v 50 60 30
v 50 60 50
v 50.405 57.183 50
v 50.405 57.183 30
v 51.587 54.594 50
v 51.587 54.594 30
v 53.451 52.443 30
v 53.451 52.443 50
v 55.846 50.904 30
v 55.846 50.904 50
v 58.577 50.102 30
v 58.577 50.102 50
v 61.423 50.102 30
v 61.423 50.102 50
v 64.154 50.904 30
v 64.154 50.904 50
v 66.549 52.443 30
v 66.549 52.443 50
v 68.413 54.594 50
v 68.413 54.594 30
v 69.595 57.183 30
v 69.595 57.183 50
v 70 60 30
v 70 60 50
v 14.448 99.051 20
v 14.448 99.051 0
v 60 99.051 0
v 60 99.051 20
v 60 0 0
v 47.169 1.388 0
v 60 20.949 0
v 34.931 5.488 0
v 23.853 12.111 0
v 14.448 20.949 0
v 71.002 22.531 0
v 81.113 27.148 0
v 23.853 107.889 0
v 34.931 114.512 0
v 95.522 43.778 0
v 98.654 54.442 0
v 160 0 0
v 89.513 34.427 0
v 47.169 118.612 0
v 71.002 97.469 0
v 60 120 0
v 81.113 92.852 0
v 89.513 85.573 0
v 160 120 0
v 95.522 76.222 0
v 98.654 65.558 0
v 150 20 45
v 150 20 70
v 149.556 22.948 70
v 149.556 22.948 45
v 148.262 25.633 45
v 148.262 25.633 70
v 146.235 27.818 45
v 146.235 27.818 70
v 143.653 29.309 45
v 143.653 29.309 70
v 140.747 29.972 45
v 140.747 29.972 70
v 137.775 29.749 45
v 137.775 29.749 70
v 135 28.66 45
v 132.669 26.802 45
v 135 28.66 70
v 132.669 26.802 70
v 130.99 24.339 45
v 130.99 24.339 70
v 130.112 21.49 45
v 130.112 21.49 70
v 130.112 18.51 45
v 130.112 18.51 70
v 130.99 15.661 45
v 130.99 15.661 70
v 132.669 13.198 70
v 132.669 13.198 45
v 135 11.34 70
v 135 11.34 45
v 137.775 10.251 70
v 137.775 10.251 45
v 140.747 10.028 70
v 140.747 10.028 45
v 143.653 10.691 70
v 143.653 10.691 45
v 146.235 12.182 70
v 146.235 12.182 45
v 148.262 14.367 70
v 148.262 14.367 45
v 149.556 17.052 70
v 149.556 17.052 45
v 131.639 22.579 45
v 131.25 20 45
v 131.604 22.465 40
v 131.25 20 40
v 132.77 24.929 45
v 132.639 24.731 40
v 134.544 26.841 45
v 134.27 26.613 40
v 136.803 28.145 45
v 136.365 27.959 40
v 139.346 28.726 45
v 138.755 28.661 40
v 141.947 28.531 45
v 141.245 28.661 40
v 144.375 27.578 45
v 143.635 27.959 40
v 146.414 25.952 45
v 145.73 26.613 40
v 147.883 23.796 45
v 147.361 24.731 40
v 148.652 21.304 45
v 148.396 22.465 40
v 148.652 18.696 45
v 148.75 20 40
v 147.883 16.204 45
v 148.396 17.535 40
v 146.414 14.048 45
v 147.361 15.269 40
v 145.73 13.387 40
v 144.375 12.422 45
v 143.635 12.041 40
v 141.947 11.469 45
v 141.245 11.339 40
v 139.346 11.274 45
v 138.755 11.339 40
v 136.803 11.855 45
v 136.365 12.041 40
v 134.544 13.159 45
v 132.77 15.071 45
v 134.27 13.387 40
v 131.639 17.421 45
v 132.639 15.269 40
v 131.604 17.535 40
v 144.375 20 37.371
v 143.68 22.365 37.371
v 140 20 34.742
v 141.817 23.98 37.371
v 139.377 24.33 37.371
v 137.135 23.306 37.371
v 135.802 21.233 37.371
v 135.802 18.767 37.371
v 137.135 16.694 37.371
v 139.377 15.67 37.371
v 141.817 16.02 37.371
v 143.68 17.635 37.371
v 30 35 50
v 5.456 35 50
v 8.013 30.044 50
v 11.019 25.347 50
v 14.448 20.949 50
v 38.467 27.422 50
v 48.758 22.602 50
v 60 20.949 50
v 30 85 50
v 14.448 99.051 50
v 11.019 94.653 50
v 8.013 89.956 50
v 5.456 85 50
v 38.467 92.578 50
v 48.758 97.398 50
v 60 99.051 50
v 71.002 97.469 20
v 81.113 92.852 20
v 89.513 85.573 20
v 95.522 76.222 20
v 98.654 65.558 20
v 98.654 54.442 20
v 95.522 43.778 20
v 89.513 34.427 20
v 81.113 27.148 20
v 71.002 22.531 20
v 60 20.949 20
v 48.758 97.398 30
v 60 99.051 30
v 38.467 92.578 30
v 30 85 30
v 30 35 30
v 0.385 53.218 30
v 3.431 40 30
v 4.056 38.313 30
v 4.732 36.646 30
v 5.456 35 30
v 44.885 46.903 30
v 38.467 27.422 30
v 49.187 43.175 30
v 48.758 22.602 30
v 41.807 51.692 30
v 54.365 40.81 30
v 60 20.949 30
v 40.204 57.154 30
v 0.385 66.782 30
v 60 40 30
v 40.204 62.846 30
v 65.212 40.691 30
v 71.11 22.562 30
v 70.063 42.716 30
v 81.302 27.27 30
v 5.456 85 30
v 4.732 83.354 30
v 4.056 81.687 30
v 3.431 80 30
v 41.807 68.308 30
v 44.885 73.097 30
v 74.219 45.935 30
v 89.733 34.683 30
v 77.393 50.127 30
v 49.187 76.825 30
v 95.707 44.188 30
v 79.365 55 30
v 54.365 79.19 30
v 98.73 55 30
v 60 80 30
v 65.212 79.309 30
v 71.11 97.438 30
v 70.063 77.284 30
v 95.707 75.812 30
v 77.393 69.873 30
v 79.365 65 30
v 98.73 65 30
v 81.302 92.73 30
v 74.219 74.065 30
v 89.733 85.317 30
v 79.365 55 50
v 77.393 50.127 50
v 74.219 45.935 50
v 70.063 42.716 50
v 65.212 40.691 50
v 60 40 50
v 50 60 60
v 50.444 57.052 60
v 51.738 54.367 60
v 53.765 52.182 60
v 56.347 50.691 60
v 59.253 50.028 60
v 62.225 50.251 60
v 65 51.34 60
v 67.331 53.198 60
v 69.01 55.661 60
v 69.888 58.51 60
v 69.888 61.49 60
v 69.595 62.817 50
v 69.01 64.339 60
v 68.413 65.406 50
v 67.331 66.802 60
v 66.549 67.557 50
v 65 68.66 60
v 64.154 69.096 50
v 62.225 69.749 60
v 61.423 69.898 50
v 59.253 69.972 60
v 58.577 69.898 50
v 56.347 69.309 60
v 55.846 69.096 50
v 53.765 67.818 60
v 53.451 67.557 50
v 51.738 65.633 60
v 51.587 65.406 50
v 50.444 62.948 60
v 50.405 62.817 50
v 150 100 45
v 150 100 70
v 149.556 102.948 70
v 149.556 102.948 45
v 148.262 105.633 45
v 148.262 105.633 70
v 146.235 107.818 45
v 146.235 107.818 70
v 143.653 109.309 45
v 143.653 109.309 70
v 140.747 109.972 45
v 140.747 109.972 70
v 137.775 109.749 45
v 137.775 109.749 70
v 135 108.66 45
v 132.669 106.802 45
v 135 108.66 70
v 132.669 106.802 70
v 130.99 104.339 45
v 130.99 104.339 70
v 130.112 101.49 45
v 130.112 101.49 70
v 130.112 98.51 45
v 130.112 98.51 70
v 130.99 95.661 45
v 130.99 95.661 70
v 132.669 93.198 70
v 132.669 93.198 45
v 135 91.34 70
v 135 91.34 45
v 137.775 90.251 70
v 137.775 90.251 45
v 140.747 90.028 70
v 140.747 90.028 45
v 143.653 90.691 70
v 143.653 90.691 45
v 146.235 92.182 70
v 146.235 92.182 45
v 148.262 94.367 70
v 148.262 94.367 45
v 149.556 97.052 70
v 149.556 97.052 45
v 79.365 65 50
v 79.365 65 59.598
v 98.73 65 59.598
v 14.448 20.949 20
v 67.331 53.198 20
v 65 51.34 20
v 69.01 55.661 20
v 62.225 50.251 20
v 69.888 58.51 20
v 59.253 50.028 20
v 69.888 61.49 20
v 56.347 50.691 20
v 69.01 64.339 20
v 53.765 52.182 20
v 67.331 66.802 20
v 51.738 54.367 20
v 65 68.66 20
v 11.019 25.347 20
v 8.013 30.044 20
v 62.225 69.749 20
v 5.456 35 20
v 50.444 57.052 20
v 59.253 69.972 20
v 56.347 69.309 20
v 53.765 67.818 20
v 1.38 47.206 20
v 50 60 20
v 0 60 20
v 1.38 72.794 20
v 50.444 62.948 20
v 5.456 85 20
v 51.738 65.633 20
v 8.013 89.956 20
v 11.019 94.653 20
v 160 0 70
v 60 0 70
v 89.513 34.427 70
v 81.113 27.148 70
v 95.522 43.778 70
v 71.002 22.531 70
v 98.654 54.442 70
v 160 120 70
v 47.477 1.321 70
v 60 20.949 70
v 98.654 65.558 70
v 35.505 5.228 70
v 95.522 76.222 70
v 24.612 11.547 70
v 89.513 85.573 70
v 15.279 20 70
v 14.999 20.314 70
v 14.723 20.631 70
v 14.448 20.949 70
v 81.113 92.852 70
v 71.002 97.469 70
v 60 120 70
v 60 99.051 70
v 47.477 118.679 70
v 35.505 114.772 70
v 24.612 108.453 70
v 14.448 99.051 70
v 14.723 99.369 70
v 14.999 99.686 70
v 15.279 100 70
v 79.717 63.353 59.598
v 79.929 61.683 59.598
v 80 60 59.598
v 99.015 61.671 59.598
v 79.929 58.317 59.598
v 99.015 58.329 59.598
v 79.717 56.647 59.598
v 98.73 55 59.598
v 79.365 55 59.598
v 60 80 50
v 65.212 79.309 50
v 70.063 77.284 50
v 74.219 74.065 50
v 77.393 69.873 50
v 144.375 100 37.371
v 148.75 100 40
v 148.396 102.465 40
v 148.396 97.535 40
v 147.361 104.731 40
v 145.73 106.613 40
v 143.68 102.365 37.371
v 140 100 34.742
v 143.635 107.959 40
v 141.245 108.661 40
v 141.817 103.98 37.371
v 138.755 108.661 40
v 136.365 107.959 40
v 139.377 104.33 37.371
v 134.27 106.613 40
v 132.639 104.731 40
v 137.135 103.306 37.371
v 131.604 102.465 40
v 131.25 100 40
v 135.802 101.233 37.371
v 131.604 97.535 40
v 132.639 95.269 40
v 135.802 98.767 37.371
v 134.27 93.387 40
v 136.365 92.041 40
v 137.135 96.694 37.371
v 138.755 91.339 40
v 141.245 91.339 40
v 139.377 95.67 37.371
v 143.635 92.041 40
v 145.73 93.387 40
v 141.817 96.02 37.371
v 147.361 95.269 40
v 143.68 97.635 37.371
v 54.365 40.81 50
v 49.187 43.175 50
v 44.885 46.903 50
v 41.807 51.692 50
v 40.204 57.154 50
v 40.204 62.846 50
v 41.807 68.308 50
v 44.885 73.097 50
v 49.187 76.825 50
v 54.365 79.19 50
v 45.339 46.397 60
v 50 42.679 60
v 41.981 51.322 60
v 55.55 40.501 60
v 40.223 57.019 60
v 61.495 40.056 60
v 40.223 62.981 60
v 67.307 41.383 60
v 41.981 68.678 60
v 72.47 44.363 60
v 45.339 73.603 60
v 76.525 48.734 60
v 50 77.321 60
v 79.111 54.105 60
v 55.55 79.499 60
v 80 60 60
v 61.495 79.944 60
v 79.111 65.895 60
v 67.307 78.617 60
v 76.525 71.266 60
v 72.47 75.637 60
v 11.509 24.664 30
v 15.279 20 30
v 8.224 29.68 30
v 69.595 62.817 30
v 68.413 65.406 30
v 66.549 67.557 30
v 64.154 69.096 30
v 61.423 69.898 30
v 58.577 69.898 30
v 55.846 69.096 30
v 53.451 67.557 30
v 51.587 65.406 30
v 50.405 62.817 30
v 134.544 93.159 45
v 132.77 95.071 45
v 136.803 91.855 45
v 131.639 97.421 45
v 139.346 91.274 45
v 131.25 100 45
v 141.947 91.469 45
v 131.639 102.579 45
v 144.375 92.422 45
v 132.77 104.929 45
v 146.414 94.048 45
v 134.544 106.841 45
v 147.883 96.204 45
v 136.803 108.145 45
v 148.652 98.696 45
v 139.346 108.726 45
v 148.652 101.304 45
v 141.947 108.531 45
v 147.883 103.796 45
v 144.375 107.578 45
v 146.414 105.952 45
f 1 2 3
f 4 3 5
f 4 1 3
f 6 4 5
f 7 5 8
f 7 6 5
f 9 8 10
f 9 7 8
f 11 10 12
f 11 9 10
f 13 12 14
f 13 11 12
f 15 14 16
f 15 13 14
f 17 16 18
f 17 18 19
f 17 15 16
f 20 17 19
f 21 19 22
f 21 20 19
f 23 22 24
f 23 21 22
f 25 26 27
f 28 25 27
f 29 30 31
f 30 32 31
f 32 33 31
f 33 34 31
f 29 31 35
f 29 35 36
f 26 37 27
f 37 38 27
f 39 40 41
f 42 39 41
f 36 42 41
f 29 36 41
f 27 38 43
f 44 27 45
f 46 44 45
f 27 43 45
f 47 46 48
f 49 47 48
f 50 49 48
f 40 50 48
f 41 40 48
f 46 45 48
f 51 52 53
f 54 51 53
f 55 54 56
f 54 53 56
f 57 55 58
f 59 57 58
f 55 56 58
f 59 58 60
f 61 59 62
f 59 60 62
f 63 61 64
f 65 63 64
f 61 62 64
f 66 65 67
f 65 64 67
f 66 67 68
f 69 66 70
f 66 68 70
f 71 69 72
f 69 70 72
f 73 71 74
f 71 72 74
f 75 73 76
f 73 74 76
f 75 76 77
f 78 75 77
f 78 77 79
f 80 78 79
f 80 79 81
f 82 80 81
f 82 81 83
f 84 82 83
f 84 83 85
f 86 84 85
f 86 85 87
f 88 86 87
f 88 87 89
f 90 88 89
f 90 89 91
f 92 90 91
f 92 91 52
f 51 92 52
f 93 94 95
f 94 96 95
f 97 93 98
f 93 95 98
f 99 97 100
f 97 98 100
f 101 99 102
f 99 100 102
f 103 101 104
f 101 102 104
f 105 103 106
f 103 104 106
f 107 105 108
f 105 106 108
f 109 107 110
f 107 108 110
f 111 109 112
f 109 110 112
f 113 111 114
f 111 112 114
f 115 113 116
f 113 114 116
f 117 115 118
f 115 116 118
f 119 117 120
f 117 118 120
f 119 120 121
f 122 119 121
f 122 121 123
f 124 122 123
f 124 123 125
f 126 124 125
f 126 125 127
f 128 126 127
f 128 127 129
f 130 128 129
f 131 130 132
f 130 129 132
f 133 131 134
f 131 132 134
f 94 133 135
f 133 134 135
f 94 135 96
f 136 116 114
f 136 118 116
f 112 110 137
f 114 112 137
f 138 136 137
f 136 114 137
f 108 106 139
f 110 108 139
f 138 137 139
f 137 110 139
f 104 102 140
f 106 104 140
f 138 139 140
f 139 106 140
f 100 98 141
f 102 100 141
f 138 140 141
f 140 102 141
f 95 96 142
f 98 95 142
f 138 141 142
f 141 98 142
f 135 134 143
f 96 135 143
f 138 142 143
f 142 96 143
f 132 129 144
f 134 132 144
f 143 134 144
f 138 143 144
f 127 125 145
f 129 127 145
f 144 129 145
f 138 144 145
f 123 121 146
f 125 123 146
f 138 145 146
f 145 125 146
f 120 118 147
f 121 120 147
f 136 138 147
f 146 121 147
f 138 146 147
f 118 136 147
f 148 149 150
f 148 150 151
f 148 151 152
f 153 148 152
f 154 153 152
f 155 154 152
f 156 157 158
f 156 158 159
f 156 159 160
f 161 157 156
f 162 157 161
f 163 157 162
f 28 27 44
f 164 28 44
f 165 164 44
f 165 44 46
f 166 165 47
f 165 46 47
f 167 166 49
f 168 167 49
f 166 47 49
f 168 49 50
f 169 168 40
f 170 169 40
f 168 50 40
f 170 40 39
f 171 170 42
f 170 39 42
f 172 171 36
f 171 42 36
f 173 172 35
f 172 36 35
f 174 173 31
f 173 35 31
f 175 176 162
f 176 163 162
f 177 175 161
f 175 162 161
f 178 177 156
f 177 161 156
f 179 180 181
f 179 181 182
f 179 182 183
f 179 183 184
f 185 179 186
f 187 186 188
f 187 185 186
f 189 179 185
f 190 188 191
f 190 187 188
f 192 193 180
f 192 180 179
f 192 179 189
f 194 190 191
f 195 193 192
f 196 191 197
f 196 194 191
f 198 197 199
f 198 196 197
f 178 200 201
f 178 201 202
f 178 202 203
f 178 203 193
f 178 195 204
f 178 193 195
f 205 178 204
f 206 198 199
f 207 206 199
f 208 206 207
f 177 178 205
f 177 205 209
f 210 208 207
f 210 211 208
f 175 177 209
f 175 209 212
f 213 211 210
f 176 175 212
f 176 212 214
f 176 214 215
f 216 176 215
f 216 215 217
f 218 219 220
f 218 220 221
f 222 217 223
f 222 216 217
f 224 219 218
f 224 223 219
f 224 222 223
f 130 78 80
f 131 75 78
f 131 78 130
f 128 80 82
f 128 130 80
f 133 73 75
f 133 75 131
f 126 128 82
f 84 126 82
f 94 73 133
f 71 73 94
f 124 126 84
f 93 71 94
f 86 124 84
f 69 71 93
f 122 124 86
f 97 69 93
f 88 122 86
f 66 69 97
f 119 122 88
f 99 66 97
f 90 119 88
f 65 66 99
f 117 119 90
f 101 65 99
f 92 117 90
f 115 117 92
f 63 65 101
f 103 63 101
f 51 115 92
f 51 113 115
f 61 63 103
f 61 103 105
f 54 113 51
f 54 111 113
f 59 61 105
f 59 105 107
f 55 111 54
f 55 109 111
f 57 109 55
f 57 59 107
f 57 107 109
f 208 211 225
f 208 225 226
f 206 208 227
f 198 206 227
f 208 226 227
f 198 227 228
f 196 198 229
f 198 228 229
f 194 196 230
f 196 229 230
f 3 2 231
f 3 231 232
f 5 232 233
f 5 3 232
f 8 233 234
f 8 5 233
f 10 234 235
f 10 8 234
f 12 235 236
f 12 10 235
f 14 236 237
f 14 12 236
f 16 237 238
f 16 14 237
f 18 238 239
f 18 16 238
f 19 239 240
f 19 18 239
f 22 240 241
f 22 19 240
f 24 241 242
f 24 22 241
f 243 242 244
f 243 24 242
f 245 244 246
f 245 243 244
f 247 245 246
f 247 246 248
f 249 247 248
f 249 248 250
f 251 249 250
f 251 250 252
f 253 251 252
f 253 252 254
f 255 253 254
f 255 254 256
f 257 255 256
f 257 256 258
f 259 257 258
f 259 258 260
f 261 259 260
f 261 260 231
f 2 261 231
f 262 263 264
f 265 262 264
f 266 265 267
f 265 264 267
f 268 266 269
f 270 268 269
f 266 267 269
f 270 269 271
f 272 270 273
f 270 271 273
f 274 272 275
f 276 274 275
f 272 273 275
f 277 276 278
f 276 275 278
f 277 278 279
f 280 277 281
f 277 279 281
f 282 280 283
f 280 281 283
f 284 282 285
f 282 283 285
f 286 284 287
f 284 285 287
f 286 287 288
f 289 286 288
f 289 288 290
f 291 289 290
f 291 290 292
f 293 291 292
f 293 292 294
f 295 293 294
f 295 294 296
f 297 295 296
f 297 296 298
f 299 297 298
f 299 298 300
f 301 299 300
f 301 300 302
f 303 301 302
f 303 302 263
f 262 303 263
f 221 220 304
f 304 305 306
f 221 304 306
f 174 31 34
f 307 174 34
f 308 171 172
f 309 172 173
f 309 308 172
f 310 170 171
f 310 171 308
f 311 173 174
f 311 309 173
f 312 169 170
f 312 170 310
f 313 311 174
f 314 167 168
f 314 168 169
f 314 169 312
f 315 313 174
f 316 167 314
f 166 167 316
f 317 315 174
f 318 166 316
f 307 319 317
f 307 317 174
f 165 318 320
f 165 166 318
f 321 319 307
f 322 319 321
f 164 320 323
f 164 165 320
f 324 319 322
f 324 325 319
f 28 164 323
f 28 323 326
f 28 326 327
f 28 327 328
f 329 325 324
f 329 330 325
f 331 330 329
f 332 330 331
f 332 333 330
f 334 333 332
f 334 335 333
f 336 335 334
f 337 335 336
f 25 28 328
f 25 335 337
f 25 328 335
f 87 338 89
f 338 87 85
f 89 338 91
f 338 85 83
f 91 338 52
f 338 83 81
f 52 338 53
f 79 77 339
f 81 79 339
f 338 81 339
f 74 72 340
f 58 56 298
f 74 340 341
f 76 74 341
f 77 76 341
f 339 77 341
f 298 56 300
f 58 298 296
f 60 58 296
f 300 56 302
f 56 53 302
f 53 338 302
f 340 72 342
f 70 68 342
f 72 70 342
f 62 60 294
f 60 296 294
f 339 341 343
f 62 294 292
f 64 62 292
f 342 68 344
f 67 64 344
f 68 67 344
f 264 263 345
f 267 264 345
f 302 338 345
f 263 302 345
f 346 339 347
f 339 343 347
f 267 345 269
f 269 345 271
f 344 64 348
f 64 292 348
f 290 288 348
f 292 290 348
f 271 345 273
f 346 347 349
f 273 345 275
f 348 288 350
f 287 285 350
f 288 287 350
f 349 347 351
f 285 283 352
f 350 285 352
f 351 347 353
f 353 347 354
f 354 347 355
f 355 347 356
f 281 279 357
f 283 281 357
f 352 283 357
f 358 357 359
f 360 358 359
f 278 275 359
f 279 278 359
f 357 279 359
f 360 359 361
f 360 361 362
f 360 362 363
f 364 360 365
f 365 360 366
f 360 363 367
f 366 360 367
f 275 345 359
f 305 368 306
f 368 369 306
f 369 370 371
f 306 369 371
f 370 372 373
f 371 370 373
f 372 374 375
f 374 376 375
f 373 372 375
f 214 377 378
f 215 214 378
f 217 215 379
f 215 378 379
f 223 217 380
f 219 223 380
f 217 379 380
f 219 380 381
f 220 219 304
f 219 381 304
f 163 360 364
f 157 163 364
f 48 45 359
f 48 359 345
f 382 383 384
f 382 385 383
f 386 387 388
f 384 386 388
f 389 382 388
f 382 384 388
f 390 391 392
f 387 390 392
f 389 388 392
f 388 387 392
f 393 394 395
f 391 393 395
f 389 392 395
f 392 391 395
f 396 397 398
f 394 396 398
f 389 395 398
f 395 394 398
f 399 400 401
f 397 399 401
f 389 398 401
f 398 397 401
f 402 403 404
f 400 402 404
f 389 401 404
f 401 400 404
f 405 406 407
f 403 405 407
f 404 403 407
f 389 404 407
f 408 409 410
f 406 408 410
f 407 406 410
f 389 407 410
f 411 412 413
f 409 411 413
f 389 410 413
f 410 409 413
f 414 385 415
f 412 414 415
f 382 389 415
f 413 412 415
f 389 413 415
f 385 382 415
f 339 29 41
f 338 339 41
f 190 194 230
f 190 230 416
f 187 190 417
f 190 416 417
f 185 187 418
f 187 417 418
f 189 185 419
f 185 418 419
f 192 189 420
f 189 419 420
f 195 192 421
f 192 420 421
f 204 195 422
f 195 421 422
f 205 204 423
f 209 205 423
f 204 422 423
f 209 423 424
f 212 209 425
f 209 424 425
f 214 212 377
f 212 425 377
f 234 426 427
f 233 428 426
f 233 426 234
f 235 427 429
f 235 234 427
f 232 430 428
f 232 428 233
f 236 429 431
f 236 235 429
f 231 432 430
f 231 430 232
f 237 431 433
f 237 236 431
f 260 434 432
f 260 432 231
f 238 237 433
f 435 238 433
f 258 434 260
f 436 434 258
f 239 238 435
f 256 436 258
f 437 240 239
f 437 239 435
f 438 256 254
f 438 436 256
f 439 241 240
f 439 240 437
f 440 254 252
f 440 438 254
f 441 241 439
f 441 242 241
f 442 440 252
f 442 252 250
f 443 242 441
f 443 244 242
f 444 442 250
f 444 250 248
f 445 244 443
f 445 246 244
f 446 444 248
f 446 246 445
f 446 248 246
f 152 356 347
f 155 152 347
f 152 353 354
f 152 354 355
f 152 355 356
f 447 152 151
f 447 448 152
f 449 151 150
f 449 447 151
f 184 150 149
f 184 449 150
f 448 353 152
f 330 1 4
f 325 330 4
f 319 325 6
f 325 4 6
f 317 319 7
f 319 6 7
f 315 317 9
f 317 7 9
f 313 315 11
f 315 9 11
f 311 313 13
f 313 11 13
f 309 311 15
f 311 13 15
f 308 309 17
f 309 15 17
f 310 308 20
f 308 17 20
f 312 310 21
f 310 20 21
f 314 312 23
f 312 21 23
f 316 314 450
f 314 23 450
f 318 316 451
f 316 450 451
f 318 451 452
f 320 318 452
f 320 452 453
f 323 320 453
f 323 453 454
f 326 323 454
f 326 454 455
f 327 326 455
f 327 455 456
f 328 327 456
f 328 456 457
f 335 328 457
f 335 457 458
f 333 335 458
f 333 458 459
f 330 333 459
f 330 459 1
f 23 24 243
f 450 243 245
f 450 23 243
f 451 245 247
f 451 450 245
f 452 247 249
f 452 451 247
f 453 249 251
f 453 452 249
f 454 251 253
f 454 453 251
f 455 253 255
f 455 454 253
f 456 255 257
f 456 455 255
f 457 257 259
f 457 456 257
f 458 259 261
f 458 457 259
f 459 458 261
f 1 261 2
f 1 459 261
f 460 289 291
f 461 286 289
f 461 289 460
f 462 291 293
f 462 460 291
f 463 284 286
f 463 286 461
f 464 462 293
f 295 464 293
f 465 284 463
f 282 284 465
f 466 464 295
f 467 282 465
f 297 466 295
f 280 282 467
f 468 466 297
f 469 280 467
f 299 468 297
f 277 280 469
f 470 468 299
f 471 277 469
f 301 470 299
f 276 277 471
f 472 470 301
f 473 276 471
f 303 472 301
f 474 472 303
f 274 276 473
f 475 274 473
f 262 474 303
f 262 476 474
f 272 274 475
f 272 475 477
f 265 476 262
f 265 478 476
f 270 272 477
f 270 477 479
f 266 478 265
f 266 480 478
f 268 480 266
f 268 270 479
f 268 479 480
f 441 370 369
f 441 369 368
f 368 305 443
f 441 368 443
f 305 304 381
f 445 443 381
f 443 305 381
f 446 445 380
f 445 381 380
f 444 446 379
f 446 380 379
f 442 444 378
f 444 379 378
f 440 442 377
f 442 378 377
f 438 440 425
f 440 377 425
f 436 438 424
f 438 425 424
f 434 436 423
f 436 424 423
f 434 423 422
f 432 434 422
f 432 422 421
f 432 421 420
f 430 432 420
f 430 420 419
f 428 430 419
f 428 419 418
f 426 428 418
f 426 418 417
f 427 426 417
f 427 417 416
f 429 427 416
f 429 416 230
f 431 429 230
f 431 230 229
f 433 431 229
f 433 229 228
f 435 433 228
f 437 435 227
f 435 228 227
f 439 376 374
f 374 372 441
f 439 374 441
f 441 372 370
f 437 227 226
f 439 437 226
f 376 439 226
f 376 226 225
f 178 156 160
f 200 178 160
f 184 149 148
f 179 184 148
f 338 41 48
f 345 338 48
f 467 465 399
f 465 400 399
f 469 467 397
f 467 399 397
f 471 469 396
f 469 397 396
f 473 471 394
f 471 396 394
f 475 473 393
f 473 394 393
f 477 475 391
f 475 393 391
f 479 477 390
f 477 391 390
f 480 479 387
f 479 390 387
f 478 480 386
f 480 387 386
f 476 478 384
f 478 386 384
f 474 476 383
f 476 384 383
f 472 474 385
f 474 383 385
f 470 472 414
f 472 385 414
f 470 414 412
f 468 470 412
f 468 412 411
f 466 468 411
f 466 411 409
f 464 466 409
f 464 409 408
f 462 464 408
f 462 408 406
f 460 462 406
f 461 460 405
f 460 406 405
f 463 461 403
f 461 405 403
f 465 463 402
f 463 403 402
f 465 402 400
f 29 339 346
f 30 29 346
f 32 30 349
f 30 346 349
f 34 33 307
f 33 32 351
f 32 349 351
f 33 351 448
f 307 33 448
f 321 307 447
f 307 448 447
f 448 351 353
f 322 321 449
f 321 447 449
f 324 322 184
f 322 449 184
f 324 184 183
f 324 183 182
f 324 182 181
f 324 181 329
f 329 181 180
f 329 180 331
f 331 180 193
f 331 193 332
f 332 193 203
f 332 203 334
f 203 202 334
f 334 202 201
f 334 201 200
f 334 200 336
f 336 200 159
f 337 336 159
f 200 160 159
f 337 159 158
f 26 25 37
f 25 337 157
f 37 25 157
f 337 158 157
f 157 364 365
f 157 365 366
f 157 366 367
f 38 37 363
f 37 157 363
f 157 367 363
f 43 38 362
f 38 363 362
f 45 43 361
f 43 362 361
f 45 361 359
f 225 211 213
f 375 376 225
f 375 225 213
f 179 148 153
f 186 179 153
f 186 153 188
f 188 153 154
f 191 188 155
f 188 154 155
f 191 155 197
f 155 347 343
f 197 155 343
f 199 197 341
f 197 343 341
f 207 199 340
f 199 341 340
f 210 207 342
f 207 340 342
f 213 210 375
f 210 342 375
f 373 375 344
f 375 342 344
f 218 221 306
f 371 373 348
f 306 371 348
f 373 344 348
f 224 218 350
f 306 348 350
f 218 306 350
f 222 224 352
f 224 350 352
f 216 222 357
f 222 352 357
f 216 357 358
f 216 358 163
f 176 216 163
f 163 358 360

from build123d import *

# Parameters (mm, degrees)
SKETCH1_W                    = 160
SKETCH1_H                    = 120
BOSS_EXTRUDE1_DEPTH          = 70
CUT_EXTRUDE1_DEPTH           = 70
M20_TAPPED_HOLE3_D           = 17.5
M20_TAPPED_HOLE3_DEPTH       = 30
M20_TAPPED_HOLE3_CBORE_D     = 20
M20_TAPPED_HOLE3_CBORE_DEPTH = 25
M20_TAPPED_HOLE3_TIP         = 5.257530416
F_20_0MM_DOWEL_SLOT1_D       = 20
F_20_0MM_DOWEL_SLOT1_DEPTH   = 40
F_20_0MM_DOWEL_SLOT1_TIP     = 6.00860619
SKETCH16_R                   = 10
CUT_EXTRUDE3_DEPTH           = 40
CUT_EXTRUDE4_DEPTH           = 40
SKETCH18_R                   = 10
BOSS_EXTRUDE2_DEPTH          = 40
CUT_EXTRUDE6_DEPTH           = 20
SKETCH20_R                   = 10
CUT_EXTRUDE7_DEPTH           = 71
SKETCH21_R                   = 10
CUT_EXTRUDE8_DEPTH           = 20
CUT_EXTRUDE11_DEPTH          = 20
CUT_EXTRUDE12_DEPTH          = 20
SKETCH25_R                   = 20
SKETCH25_R_2                 = 10
BOSS_EXTRUDE6_DEPTH          = 10
RIB1_REACH                   = 186.662
SKETCH26_WALL_W              = 391.050063724
SKETCH26_WALL_H              = 10


with BuildPart() as part:
    # Sketch1 → Boss-Extrude1 (new body)
    with BuildSketch(Plane.XY):
        with Locations((80, 60)):
            Rectangle(SKETCH1_W, SKETCH1_H)
    extrude(amount=BOSS_EXTRUDE1_DEPTH)

    # Sketch2 → Cut-Extrude1 (cut)
    with BuildSketch(Plane.XY.offset(70)):
        with BuildLine():
            Line((60, 120), (0, 120))
            Line((0, 120), (0, 60))
            ThreePointArc((0, 60), (17.573593129, 102.426406871), (60, 120))
        make_face()
        with BuildLine():
            ThreePointArc((60, 0), (17.573593129, 17.573593129), (0, 60))
            Line((0, 60), (0, 0))
            Line((0, 0), (60, 0))
        make_face()
    extrude(amount=-CUT_EXTRUDE1_DEPTH, mode=Mode.SUBTRACT)

    # M20 Tapped Hole3
    with Locations(Plane(origin=(140, 100, 70), x_dir=(1, 0, 0), z_dir=(0, 0, 1))):
        with Locations((0, 0), (0, -80)):
            CounterBoreHole(M20_TAPPED_HOLE3_D / 2, M20_TAPPED_HOLE3_CBORE_D / 2, M20_TAPPED_HOLE3_CBORE_DEPTH, depth=M20_TAPPED_HOLE3_DEPTH)
            with Locations((0, 0, -(M20_TAPPED_HOLE3_DEPTH + M20_TAPPED_HOLE3_TIP / 2))):  # 118° drill point
                Cone(0, M20_TAPPED_HOLE3_D / 2, M20_TAPPED_HOLE3_TIP, mode=Mode.SUBTRACT)

    # 20.0mm Dowel Slot1
    with Locations(Plane.XY.offset(70)):
        with Locations((60, 60)):
            Hole(F_20_0MM_DOWEL_SLOT1_D / 2, depth=F_20_0MM_DOWEL_SLOT1_DEPTH)
            with Locations((0, 0, -(F_20_0MM_DOWEL_SLOT1_DEPTH + F_20_0MM_DOWEL_SLOT1_TIP / 2))):  # 118° drill point
                Cone(0, F_20_0MM_DOWEL_SLOT1_D / 2, F_20_0MM_DOWEL_SLOT1_TIP, mode=Mode.SUBTRACT)

    # Sketch16 → Cut-Extrude3 (cut)
    with BuildSketch(Plane.XY.offset(70)):
        with BuildLine():
            ThreePointArc((28.775010008, 35), (100, 60), (28.775010008, 85))
            Line((28.775010008, 85), (5.456439427, 85))
            ThreePointArc((5.456439427, 85), (0, 60), (5.456439427, 35))
            Line((5.456439427, 35), (28.775010008, 35))
        make_face()
        with Locations((60, 60)):
            Circle(SKETCH16_R, mode=Mode.SUBTRACT)
    extrude(amount=-CUT_EXTRUDE3_DEPTH, mode=Mode.SUBTRACT)

    # Sketch17 → Cut-Extrude4 (cut)
    with BuildSketch(Plane.XY.offset(30)):
        with BuildLine():
            Line((5.456439427, 85), (28.775010008, 85))
            ThreePointArc((28.775010008, 85), (42.679491924, 96.055512755), (60, 100))
            Line((60, 100), (15.27864045, 100))
            ThreePointArc((15.27864045, 100), (9.804072956, 92.868965731), (5.456439427, 85))
        make_face()
        with BuildLine():
            Line((28.775010008, 35), (5.456439427, 35))
            ThreePointArc((5.456439427, 35), (9.804072956, 27.131034269), (15.27864045, 20))
            Line((15.27864045, 20), (60, 20))
            ThreePointArc((60, 20), (42.679491924, 23.944487245), (28.775010008, 35))
        make_face()
    extrude(amount=CUT_EXTRUDE4_DEPTH, mode=Mode.SUBTRACT)

    # Sketch18 → Boss-Extrude2 (add)
    with BuildSketch(Plane.XY.offset(30)):
        with BuildLine():
            Line((60, 20), (15.27864045, 20))
            ThreePointArc((15.27864045, 20), (0, 60), (15.27864045, 100))
            Line((15.27864045, 100), (60, 100))
            ThreePointArc((60, 100), (100, 60), (60, 20))
        make_face()
        with Locations((60, 60)):
            Circle(SKETCH18_R, mode=Mode.SUBTRACT)
    extrude(amount=BOSS_EXTRUDE2_DEPTH)

    # Sketch19 → Cut-Extrude6 (cut)
    with BuildSketch(Plane(origin=(0, 0, 0), x_dir=(-1, 0, 0), z_dir=(0, 0, -1))):
        with BuildLine():
            ThreePointArc((-60, 99.05124838), (-43.43620227, 95.364397418), (-30, 85))
            Line((-30, 85), (-5.456439427, 85))
            ThreePointArc((-5.456439427, 85), (-9.461419592, 92.339633429), (-14.447832104, 99.05124838))
            Line((-14.447832104, 99.05124838), (-60, 99.05124838))
        make_face()
        with BuildLine():
            Line((-5.456439427, 85), (-30, 85))
            ThreePointArc((-30, 85), (-43.43620227, 95.364397418), (-60, 99.05124838))
            ThreePointArc((-60, 99.05124838), (-99.05124838, 60), (-60, 20.94875162))
            ThreePointArc((-60, 20.94875162), (-43.43620227, 24.635602582), (-30, 35))
            Line((-30, 35), (-5.456439427, 35))
            ThreePointArc((-5.456439427, 35), (0, 60), (-5.456439427, 85))
        make_face()
        with BuildLine():
            ThreePointArc((-14.447832104, 20.94875162), (-9.461419592, 27.660366571), (-5.456439427, 35))
            Line((-5.456439427, 35), (-30, 35))
            ThreePointArc((-30, 35), (-43.43620227, 24.635602582), (-60, 20.94875162))
            Line((-60, 20.94875162), (-14.447832104, 20.94875162))
        make_face()
    extrude(amount=-CUT_EXTRUDE6_DEPTH, mode=Mode.SUBTRACT)

    # Sketch20 → Cut-Extrude7 (cut)
    with BuildSketch(Plane.XY.offset(70)):
        with Locations(Location((60, 60, 0), (0, 0, 180))):
            Circle(SKETCH20_R)
    extrude(amount=-CUT_EXTRUDE7_DEPTH, mode=Mode.SUBTRACT)

    # Sketch21 → Cut-Extrude8 (cut)
    with BuildSketch(Plane.XY.offset(70)):
        with BuildLine():
            Line((30, 35), (5.456439427, 35))
            ThreePointArc((5.456439427, 35), (9.461419592, 27.660366571), (14.447832104, 20.94875162))
            Line((14.447832104, 20.94875162), (60, 20.94875162))
            ThreePointArc((60, 20.94875162), (43.43620227, 24.635602582), (30, 35))
        make_face()
        with BuildLine():
            Line((5.456439427, 85), (30, 85))
            ThreePointArc((30, 85), (43.43620227, 95.364397418), (60, 99.05124838))
            Line((60, 99.05124838), (14.447832104, 99.05124838))
            ThreePointArc((14.447832104, 99.05124838), (9.461419592, 92.339633429), (5.456439427, 85))
        make_face()
        with BuildLine():
            ThreePointArc((60, 99.05124838), (43.43620227, 95.364397418), (30, 85))
            Line((30, 85), (5.456439427, 85))
            ThreePointArc((5.456439427, 85), (0, 60), (5.456439427, 35))
            Line((5.456439427, 35), (30, 35))
            ThreePointArc((30, 35), (43.43620227, 24.635602582), (60, 20.94875162))
            ThreePointArc((60, 20.94875162), (99.05124838, 60), (60, 99.05124838))
        make_face()
        with Locations(Location((60, 60, 0), (0, 0, 180))):
            Circle(SKETCH21_R, mode=Mode.SUBTRACT)
    extrude(amount=-CUT_EXTRUDE8_DEPTH, mode=Mode.SUBTRACT)

    # Sketch22 → Cut-Extrude11 (cut)
    with BuildSketch(Plane.XY.offset(50)):
        with BuildLine():
            ThreePointArc((60, 99.05124838), (43.43620227, 95.364397418), (30, 85))
            Line((30, 85), (5.456439427, 85))
            ThreePointArc((5.456439427, 85), (4.387727415, 82.522769322), (3.431457505, 80))
            Line((3.431457505, 80), (60, 80))
            ThreePointArc((60, 80), (74.142135624, 74.142135624), (80, 60))
            ThreePointArc((80, 60), (74.142135624, 45.857864376), (60, 40))
            Line((60, 40), (3.431457505, 40))
            ThreePointArc((3.431457505, 40), (4.387727415, 37.477230678), (5.456439427, 35))
            Line((5.456439427, 35), (30, 35))
            ThreePointArc((30, 35), (43.43620227, 24.635602582), (60, 20.94875162))
            ThreePointArc((60, 20.94875162), (99.05124838, 60), (60, 99.05124838))
        make_face()
    extrude(amount=-CUT_EXTRUDE11_DEPTH, mode=Mode.SUBTRACT)

    # Sketch23 → Cut-Extrude12 (cut)
    with BuildSketch(Plane.XY.offset(50)):
        with BuildLine():
            ThreePointArc((60, 40), (40, 60), (60, 80))
            Line((60, 80), (3.431457505, 80))
            ThreePointArc((3.431457505, 80), (0, 60), (3.431457505, 40))
            Line((3.431457505, 40), (60, 40))
        make_face()
    extrude(amount=-CUT_EXTRUDE12_DEPTH, mode=Mode.SUBTRACT)

    # Sketch25 → Boss-Extrude6 (add)
    with BuildSketch(Plane.XY.offset(50)):
        with Locations((60, 60)):
            Circle(SKETCH25_R)
        with Locations(Location((60, 60, 0), (0, 0, 180))):
            Circle(SKETCH25_R_2, mode=Mode.SUBTRACT)
    extrude(amount=BOSS_EXTRUDE6_DEPTH)

    # Sketch26 wall → Rib1 (add, up to next)
    with BuildSketch(Plane(origin=(89.34113782, 60, 59.598387785), x_dir=(1, 0, 0), z_dir=(0, 0, -1)), mode=Mode.PRIVATE) as rib1_sk1:
        Rectangle(SKETCH26_WALL_W, SKETCH26_WALL_H)
    rib1_tool1 = extrude(rib1_sk1.sketch, amount=RIB1_REACH, mode=Mode.PRIVATE) - part.part
    add(rib1_tool1.solids().sort_by_distance((89.34113782, 60, 59.598387785))[0])


solid = part.part
